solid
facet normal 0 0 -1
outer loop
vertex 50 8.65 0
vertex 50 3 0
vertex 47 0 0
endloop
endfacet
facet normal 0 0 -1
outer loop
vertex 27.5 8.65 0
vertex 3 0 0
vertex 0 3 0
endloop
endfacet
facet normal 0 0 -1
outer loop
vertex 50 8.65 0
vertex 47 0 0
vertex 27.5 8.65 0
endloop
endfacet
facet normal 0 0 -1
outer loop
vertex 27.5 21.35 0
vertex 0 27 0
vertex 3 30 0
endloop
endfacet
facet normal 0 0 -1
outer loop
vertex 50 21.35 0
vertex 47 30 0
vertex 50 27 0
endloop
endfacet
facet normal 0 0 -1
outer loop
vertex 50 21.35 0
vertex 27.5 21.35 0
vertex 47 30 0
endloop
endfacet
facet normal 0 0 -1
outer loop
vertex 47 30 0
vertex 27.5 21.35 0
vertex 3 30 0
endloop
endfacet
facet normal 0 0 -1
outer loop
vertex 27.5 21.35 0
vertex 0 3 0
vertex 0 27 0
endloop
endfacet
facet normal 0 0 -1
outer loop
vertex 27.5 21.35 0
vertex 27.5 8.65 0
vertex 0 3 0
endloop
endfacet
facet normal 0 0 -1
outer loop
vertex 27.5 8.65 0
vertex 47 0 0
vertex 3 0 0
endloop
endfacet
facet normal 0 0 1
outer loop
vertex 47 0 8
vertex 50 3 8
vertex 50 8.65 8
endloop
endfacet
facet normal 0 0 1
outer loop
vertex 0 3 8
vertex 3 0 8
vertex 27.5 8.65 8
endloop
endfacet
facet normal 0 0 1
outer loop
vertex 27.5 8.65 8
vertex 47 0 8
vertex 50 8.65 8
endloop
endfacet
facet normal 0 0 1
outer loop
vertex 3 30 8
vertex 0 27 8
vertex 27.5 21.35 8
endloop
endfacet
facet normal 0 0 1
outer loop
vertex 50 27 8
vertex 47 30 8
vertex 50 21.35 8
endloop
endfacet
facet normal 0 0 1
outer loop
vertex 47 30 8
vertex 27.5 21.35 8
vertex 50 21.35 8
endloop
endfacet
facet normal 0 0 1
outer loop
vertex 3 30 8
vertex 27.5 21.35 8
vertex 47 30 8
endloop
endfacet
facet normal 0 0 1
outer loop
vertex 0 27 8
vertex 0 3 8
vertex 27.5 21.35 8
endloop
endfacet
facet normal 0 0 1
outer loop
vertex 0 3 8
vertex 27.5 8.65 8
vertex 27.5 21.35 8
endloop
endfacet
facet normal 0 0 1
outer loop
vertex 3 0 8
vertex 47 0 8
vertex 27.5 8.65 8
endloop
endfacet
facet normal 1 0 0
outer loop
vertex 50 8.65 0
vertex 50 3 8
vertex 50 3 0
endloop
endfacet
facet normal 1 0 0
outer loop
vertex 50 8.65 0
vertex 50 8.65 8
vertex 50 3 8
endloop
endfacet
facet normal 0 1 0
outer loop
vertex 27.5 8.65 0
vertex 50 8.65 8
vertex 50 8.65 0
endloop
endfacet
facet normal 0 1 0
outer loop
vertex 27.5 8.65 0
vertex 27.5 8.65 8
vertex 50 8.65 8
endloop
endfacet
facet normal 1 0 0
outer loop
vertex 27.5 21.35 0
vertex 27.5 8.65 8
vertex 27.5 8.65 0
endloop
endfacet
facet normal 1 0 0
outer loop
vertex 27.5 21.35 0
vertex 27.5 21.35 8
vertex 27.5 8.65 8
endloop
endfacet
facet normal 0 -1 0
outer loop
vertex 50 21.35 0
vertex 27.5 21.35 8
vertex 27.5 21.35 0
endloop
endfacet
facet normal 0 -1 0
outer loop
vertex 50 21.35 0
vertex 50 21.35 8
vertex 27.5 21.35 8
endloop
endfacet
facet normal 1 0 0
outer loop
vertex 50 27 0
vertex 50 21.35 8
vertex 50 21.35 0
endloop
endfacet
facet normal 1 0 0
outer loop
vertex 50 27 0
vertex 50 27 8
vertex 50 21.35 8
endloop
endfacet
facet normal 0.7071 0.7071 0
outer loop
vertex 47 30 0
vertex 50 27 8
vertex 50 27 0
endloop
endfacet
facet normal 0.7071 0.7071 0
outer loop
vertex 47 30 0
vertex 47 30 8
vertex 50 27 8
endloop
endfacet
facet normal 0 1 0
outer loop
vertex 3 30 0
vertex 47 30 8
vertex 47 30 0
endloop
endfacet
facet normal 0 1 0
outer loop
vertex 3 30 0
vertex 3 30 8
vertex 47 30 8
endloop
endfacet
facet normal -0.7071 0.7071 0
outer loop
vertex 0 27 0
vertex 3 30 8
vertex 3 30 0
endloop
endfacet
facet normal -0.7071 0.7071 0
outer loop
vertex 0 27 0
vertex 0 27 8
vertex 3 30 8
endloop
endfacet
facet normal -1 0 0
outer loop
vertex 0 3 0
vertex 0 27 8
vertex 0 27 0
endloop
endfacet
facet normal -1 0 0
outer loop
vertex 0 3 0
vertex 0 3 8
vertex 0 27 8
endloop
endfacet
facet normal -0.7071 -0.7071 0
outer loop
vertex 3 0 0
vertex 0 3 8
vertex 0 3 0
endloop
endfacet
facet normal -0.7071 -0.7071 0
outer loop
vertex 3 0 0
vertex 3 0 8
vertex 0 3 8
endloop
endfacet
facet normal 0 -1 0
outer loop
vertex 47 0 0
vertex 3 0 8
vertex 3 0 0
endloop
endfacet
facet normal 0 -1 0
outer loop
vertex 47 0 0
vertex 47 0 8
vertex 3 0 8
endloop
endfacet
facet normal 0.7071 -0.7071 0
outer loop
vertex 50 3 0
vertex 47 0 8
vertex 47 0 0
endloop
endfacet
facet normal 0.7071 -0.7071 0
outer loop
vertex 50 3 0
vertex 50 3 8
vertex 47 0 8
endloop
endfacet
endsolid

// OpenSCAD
$fn = 32;

// ----------------------------------------------------------------------
// C washer: 50 x 30 mm plate with an open slot
// ----------------------------------------------------------------------

// --- parameters (mm) ---
profile_height = 8;       // extrusion height
profile_points = 12;      // points of the closed outline

profile = [[3, 0], [47, 0], [50, 3], [50, 8.65], [27.5, 8.65], [27.5, 21.35], [50, 21.35], [50, 27], [47, 30], [3, 30], [0, 27], [0, 3]];  // single closed polygon, 12 points, counter clockwise

// --- the one profile operation ---
linear_extrude(height = profile_height) polygon(points = profile);
